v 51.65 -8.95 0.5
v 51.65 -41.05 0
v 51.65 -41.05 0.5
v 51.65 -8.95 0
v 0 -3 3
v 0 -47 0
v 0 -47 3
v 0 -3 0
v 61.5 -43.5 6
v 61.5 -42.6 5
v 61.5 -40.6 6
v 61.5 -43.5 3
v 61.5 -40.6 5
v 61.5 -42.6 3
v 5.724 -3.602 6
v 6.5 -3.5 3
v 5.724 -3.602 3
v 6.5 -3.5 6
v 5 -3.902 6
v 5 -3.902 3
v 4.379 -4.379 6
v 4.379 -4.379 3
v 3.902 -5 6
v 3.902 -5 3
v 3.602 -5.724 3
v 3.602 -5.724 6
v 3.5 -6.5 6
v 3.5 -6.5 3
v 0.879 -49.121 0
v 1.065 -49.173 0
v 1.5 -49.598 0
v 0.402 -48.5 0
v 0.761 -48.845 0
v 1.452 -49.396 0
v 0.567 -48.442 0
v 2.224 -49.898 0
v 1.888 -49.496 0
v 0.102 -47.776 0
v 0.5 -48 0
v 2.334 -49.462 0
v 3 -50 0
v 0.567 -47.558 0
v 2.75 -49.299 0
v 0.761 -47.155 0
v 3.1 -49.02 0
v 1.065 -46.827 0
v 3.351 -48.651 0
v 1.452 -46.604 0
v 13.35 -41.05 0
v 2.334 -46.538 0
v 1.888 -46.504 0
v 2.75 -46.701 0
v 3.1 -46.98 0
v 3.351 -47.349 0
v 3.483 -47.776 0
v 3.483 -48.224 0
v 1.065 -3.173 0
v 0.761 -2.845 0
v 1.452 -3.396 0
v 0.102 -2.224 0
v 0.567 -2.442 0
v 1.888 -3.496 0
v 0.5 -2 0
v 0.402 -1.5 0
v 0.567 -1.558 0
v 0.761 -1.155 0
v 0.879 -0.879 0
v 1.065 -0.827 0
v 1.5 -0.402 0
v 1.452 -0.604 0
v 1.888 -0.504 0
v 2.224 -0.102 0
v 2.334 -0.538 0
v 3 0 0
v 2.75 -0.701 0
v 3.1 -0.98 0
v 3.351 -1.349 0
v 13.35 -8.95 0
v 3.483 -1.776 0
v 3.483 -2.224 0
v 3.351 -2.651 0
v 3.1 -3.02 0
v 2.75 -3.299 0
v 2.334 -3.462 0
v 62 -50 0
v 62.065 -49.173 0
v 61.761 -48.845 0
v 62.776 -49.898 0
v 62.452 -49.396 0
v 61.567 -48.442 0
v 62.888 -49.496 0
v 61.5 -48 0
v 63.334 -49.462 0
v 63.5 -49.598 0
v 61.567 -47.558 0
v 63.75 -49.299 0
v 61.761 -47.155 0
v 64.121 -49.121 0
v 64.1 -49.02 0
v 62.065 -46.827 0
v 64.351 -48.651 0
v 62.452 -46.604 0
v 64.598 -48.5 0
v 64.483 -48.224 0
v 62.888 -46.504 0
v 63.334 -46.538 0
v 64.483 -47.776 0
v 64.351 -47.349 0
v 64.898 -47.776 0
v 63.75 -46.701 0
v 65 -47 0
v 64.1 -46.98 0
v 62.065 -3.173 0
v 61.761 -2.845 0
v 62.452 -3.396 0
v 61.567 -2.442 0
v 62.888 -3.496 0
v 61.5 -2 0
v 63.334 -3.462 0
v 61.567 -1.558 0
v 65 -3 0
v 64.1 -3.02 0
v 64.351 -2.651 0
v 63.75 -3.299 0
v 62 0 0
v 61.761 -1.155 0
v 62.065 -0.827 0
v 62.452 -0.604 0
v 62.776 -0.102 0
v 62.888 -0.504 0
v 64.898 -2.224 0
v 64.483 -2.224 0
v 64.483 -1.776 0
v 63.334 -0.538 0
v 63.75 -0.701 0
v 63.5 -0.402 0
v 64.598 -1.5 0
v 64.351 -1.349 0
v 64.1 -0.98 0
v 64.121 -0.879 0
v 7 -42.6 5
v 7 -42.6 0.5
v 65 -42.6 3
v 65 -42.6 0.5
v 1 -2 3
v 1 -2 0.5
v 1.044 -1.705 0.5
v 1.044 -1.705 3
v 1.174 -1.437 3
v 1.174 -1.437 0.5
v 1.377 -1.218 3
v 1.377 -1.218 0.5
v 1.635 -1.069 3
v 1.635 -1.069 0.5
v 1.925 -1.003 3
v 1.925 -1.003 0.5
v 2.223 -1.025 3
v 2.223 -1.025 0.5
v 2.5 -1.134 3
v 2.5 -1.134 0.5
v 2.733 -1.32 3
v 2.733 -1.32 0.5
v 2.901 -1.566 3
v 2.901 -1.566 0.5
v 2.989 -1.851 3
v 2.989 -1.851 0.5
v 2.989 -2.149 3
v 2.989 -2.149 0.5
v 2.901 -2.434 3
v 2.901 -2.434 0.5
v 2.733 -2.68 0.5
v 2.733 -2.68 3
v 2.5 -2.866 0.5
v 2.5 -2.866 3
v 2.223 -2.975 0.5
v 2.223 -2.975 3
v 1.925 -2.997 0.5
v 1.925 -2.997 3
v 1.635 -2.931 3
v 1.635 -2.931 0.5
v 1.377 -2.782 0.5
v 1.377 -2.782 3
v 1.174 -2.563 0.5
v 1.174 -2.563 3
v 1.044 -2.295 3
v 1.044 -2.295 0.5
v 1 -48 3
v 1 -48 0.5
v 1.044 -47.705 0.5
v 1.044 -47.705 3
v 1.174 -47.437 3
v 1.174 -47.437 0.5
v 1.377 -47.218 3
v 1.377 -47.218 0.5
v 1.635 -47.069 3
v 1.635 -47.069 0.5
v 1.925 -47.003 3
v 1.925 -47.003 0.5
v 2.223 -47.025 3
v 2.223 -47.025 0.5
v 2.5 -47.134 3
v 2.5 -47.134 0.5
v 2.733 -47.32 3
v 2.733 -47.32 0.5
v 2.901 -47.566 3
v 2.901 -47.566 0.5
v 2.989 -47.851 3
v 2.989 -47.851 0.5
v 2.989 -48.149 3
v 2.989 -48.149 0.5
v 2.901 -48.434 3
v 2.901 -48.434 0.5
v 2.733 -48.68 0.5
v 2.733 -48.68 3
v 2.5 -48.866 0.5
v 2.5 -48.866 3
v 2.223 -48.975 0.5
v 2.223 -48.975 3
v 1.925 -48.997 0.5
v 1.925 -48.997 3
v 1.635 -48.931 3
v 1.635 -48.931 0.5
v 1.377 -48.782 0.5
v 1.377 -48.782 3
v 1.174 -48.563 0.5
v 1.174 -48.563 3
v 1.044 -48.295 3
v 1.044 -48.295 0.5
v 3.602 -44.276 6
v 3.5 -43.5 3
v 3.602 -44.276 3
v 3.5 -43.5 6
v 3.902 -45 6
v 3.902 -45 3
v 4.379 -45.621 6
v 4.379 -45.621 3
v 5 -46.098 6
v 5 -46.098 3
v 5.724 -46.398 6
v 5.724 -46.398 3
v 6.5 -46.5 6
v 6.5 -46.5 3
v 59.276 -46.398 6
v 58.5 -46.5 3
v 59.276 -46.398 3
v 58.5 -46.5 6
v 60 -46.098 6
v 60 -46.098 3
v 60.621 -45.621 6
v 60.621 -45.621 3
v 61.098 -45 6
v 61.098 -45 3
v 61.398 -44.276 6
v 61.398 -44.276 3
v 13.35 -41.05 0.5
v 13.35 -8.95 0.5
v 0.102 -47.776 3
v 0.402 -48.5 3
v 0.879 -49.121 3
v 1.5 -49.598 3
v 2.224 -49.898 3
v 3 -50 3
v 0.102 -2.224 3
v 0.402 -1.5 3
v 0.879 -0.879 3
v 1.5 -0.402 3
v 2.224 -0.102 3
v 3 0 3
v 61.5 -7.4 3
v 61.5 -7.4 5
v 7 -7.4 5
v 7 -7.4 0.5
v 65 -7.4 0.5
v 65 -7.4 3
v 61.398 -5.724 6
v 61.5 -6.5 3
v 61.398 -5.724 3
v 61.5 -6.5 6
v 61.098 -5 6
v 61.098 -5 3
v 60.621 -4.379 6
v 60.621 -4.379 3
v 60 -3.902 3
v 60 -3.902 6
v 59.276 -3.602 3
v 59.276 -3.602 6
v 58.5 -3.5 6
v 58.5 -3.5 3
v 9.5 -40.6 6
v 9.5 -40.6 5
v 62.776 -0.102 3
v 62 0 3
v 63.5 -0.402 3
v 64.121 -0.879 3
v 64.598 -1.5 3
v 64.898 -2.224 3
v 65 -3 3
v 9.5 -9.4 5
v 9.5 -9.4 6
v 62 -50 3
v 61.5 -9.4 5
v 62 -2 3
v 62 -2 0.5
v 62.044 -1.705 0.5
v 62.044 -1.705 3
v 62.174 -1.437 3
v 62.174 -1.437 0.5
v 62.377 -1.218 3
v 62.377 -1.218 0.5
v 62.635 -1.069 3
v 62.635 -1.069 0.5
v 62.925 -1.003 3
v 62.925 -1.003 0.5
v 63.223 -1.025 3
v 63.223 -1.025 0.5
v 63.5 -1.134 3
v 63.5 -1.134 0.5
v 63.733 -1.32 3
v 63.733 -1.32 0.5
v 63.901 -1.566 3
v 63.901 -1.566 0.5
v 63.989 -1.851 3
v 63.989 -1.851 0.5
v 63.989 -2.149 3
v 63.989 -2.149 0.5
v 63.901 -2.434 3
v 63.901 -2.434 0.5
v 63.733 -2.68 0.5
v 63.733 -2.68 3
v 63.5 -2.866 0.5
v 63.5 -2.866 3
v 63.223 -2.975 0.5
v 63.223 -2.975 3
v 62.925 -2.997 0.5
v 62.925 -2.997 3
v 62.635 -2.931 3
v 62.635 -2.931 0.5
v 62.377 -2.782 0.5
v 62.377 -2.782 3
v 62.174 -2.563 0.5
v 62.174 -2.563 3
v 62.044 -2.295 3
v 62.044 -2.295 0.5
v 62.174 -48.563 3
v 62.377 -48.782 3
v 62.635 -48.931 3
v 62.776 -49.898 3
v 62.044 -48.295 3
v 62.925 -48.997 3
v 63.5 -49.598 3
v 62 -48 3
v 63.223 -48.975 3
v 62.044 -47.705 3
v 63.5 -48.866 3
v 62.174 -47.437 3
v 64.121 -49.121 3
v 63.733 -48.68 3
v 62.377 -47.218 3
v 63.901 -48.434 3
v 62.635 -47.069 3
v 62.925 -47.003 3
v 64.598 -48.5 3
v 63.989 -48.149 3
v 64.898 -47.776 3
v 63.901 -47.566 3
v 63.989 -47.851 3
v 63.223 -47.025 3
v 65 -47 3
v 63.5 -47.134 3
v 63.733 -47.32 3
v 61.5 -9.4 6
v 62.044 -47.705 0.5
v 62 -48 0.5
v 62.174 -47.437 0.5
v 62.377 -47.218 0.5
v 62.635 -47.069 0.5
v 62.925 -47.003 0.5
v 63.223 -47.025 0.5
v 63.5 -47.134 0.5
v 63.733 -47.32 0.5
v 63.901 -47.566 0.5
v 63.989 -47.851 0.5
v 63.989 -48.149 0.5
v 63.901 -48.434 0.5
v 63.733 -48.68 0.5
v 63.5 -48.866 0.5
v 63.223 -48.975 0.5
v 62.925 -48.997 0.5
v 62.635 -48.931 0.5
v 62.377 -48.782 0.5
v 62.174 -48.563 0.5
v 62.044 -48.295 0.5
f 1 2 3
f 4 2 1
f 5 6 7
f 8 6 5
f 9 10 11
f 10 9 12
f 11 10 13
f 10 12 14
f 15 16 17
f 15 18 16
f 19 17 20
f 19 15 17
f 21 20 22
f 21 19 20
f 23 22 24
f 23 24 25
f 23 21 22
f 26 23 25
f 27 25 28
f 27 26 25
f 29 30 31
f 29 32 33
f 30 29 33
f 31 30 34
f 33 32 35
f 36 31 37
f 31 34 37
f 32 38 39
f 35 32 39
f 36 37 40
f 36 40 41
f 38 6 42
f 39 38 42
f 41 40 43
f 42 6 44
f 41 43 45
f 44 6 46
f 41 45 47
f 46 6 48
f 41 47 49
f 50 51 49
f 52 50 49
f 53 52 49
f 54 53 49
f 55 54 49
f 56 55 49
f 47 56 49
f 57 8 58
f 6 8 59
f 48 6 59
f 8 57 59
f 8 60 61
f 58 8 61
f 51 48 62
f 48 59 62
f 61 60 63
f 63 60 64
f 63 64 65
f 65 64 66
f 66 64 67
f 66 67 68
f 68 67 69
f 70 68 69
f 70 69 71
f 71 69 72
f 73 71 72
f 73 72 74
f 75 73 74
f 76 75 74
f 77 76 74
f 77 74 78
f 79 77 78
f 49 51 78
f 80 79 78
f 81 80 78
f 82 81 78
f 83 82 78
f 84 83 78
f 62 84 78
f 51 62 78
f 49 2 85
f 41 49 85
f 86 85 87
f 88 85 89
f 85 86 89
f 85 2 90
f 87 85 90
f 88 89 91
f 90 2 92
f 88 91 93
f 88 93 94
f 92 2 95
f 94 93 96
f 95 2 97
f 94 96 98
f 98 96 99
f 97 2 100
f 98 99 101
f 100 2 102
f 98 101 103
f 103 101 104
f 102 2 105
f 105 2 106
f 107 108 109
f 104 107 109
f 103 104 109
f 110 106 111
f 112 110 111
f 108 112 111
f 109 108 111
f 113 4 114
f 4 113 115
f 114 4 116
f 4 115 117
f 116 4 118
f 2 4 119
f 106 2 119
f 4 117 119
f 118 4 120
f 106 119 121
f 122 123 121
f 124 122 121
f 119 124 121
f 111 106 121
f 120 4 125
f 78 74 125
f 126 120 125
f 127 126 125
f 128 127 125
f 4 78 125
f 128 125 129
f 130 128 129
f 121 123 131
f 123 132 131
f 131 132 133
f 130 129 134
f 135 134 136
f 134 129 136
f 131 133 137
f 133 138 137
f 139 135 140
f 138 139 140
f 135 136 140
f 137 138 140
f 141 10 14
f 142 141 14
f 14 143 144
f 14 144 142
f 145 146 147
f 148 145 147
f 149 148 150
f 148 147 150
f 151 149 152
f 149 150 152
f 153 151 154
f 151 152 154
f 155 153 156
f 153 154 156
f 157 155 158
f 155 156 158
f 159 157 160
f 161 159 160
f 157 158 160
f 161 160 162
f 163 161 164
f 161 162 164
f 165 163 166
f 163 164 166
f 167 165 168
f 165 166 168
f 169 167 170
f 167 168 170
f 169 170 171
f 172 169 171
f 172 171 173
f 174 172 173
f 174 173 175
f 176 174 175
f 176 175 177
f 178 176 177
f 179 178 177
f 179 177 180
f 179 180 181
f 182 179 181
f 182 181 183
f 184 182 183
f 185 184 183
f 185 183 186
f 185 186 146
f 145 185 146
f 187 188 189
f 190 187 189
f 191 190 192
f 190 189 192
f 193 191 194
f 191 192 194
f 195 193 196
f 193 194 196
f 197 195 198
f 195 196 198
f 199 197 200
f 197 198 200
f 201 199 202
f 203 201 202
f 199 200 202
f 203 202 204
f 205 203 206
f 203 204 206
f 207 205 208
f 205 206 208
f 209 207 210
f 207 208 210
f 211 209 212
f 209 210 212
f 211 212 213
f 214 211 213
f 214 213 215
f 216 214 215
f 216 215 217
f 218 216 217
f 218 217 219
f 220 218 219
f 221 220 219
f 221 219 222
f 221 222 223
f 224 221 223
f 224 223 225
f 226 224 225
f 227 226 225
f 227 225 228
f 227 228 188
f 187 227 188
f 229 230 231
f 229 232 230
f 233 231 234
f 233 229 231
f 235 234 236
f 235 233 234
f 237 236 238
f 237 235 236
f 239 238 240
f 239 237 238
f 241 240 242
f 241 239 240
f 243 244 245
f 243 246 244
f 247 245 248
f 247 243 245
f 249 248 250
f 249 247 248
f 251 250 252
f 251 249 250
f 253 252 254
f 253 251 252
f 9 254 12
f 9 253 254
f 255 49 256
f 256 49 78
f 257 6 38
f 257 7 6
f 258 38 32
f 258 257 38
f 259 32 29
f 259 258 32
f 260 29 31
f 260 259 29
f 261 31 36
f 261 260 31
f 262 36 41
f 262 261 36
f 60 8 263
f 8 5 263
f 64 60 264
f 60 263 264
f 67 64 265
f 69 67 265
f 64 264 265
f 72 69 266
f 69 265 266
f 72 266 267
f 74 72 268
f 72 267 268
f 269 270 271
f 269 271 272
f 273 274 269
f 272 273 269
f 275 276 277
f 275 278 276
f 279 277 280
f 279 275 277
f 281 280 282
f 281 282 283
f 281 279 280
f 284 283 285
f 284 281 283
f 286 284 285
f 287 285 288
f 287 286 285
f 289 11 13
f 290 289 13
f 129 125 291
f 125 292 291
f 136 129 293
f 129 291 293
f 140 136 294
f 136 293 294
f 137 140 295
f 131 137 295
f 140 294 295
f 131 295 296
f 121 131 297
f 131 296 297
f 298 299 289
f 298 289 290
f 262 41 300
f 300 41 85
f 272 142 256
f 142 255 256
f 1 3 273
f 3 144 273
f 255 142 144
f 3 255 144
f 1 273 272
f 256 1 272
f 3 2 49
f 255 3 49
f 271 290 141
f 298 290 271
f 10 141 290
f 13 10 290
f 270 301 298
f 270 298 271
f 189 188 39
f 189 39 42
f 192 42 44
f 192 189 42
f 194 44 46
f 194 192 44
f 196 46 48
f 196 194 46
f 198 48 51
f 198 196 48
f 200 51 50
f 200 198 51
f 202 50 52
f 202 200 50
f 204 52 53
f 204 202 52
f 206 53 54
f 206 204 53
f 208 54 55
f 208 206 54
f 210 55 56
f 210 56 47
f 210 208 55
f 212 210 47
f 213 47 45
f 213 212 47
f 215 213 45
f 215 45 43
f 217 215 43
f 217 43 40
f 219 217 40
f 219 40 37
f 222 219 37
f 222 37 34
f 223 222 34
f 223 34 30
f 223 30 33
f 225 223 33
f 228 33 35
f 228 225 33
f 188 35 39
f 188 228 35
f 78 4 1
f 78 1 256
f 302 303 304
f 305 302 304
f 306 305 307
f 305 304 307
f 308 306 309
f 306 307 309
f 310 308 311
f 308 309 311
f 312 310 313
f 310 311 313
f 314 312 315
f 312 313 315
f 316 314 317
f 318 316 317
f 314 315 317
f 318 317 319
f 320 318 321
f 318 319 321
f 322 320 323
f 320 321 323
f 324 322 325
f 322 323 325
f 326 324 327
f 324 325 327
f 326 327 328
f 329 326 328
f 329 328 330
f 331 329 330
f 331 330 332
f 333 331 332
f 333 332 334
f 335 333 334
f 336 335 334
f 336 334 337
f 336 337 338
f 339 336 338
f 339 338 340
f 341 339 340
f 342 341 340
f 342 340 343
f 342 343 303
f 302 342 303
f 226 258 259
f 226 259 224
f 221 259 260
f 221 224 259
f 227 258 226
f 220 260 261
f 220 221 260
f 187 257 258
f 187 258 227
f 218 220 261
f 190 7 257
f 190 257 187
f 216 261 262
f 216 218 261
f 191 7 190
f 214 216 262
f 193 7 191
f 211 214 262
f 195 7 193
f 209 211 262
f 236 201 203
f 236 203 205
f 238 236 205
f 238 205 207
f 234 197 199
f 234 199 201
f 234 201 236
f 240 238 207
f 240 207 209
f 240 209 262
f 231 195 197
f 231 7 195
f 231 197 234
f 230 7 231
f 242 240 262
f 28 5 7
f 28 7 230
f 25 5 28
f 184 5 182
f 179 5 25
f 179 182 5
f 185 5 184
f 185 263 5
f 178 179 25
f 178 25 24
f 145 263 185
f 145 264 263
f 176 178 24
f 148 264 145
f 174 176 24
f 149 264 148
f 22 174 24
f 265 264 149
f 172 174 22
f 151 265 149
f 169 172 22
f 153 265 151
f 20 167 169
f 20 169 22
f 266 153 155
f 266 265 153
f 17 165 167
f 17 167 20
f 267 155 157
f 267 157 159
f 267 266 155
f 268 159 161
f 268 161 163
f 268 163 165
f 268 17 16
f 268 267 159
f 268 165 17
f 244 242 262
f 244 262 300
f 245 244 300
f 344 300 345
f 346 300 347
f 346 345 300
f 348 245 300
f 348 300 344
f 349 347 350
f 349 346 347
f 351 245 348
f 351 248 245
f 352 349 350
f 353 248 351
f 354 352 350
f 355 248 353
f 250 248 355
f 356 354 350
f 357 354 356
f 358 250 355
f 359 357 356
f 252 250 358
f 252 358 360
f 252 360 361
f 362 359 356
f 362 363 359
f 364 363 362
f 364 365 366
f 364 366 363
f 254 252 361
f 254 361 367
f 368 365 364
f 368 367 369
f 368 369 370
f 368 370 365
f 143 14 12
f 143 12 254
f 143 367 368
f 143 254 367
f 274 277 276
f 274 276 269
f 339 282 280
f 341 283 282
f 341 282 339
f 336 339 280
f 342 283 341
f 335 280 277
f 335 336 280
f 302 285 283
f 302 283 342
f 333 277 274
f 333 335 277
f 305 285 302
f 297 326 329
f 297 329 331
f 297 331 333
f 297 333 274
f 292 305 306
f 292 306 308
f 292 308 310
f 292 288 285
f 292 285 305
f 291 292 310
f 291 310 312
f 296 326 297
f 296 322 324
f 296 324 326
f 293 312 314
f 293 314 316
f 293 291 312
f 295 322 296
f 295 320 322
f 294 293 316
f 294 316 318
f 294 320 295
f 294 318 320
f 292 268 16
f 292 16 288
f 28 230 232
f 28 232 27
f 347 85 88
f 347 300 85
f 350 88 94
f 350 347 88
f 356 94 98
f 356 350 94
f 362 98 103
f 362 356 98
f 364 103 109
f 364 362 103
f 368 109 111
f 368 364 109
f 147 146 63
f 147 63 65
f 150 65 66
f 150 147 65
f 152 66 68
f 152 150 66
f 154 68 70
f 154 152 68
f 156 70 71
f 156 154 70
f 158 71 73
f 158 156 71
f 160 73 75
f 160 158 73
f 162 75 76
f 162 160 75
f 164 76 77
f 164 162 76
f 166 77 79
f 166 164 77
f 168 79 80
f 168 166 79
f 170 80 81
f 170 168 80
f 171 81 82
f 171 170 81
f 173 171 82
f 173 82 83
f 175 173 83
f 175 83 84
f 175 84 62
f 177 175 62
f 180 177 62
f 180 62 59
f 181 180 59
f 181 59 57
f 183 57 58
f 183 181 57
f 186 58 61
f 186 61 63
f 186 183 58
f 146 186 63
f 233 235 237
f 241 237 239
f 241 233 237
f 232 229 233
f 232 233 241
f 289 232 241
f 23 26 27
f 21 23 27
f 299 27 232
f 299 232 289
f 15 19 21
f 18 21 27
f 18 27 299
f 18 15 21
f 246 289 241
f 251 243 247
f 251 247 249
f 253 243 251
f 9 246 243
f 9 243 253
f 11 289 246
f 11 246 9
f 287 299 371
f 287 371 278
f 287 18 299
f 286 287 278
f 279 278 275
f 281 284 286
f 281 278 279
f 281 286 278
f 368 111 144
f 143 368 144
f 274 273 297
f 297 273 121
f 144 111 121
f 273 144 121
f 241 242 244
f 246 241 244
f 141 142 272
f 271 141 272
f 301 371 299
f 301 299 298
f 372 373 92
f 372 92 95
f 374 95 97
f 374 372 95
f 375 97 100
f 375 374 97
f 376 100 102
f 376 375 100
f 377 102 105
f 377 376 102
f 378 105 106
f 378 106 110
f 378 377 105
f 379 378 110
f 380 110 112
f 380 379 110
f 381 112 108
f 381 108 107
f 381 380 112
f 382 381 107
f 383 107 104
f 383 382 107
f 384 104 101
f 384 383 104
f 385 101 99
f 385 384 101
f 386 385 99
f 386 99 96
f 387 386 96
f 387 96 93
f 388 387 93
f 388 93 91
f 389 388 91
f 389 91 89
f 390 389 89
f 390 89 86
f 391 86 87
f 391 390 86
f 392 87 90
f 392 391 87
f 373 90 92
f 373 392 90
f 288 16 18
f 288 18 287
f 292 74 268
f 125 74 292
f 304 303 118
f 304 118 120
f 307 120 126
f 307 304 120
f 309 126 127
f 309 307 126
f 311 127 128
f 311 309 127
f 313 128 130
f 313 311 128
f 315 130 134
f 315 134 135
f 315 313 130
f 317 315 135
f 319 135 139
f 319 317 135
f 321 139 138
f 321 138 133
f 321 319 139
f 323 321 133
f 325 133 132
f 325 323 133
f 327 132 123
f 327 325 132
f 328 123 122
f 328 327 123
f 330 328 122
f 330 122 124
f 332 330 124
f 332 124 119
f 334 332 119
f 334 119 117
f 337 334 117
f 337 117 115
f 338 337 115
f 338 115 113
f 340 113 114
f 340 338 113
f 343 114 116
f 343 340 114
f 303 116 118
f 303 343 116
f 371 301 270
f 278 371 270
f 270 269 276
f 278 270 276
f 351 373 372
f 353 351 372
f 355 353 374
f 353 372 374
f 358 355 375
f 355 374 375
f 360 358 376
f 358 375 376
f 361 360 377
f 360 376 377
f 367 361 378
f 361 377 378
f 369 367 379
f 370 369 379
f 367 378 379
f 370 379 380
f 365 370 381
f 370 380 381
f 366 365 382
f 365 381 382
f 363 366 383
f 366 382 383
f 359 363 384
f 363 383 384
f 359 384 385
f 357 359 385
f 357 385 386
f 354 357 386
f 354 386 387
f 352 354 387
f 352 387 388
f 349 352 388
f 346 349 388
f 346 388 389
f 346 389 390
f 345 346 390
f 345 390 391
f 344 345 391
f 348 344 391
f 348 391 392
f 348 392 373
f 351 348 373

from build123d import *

# Parameters (mm, degrees)
SKIZZE1_W                       = 65
SKIZZE1_H                       = 50
AUFSATZ_LINEAR_AUSTRAGEN1_DEPTH = 3
SKIZZE2_W                       = 58
SKIZZE2_H                       = 43
AUFSATZ_LINEAR_AUSTRAGEN2_DEPTH = 3
SKIZZE7_W                       = 35.2
SKIZZE7_H                       = 4.5
SCHNITT_LINEAR_AUSTRAGEN2_DEPTH = 58
SKIZZE9_W                       = 1
SKIZZE9_H                       = 31.2
SCHNITT_LINEAR_AUSTRAGEN3_DEPTH = 52
SCHNITT_LINEAR_AUSTRAGEN4_REACH = 8
SKIZZE10_W                      = 38.3
SKIZZE10_H                      = 32.1
VERRUNDUNG2_R                   = 3
SKIZZE11_R                      = 1
SCHNITT_LINEAR_AUSTRAGEN5_DEPTH = 7
FASE1_SIZE                      = 0.5


with BuildPart() as part:
    # Skizze1 → Aufsatz-Linear austragen1 (new body)
    with BuildSketch(Plane.XY):
        with Locations((32.5, -25)):
            Rectangle(SKIZZE1_W, SKIZZE1_H)
    extrude(amount=AUFSATZ_LINEAR_AUSTRAGEN1_DEPTH)

    # Skizze2 → Aufsatz-Linear austragen2 (add)
    with BuildSketch(Plane.XY.offset(3)):
        with Locations((32.5, -25)):
            Rectangle(SKIZZE2_W, SKIZZE2_H)
    extrude(amount=AUFSATZ_LINEAR_AUSTRAGEN2_DEPTH)

    # Skizze7 → Schnitt-Linear austragen2 (cut)
    with BuildSketch(Plane(origin=(65, -65, 0), x_dir=(0, 1, 0), z_dir=(-1, 0, 0))):
        with Locations((40, -2.75)):
            Rectangle(SKIZZE7_W, SKIZZE7_H)
    extrude(amount=SCHNITT_LINEAR_AUSTRAGEN2_DEPTH, mode=Mode.SUBTRACT)

    # Skizze9 → Schnitt-Linear austragen3 (cut)
    with BuildSketch(Plane(origin=(61.5, 0, 0), x_dir=(0, 0, -1), z_dir=(1, 0, 0))):
        with Locations((-5.5, -25)):
            Rectangle(SKIZZE9_W, SKIZZE9_H)
    extrude(amount=-SCHNITT_LINEAR_AUSTRAGEN3_DEPTH, mode=Mode.SUBTRACT)

    # Skizze10 → Schnitt-Linear austragen4 (cut, up to next)
    with BuildSketch(Plane(origin=(0, 0, 0), x_dir=(-1, 0, 0), z_dir=(0, 0, -1)), mode=Mode.PRIVATE) as schnitt_linear_austragen4_sk1:
        with Locations((-32.5, -25)):
            Rectangle(SKIZZE10_W, SKIZZE10_H)
    schnitt_linear_austragen4_tool1 = extrude(schnitt_linear_austragen4_sk1.sketch, amount=-SCHNITT_LINEAR_AUSTRAGEN4_REACH, mode=Mode.PRIVATE) & part.part
    add(schnitt_linear_austragen4_tool1.solids().sort_by_distance((32.5, -25, 0))[0], mode=Mode.SUBTRACT)

    # Verrundung2
    verrundung2_edges = [part.edges().sort_by_distance(p)[0] for p in [
        (61.5, -3.5, 4.5),
        (3.5, -3.5, 4.5),
        (3.5, -46.5, 4.5),
        (61.5, -46.5, 4.5),
        (0, 0, 1.5),
        (65, 0, 1.5),
        (65, -50, 1.5),
        (0, -50, 1.5),
    ]]
    fillet(verrundung2_edges, radius=VERRUNDUNG2_R)

    # Skizze11 → Schnitt-Linear austragen5 (cut, through all)
    with BuildSketch(Plane(origin=(0, 0, 0), x_dir=(-1, 0, 0), z_dir=(0, 0, -1))):
        with Locations((-63, -2)):
            Circle(SKIZZE11_R)
        with Locations((-2, -2)):
            Circle(SKIZZE11_R)
        with Locations((-2, -48)):
            Circle(SKIZZE11_R)
        with Locations((-63, -48)):
            Circle(SKIZZE11_R)
    extrude(amount=-SCHNITT_LINEAR_AUSTRAGEN5_DEPTH, mode=Mode.SUBTRACT)

    # Fase1
    fase1_edges = [part.edges().sort_by_distance(p)[0] for p in [
        (64, -2, 0),
        (3, -2, 0),
        (3, -48, 0),
        (64, -48, 0),
    ]]
    chamfer(fase1_edges, length=FASE1_SIZE)


solid = part.part
